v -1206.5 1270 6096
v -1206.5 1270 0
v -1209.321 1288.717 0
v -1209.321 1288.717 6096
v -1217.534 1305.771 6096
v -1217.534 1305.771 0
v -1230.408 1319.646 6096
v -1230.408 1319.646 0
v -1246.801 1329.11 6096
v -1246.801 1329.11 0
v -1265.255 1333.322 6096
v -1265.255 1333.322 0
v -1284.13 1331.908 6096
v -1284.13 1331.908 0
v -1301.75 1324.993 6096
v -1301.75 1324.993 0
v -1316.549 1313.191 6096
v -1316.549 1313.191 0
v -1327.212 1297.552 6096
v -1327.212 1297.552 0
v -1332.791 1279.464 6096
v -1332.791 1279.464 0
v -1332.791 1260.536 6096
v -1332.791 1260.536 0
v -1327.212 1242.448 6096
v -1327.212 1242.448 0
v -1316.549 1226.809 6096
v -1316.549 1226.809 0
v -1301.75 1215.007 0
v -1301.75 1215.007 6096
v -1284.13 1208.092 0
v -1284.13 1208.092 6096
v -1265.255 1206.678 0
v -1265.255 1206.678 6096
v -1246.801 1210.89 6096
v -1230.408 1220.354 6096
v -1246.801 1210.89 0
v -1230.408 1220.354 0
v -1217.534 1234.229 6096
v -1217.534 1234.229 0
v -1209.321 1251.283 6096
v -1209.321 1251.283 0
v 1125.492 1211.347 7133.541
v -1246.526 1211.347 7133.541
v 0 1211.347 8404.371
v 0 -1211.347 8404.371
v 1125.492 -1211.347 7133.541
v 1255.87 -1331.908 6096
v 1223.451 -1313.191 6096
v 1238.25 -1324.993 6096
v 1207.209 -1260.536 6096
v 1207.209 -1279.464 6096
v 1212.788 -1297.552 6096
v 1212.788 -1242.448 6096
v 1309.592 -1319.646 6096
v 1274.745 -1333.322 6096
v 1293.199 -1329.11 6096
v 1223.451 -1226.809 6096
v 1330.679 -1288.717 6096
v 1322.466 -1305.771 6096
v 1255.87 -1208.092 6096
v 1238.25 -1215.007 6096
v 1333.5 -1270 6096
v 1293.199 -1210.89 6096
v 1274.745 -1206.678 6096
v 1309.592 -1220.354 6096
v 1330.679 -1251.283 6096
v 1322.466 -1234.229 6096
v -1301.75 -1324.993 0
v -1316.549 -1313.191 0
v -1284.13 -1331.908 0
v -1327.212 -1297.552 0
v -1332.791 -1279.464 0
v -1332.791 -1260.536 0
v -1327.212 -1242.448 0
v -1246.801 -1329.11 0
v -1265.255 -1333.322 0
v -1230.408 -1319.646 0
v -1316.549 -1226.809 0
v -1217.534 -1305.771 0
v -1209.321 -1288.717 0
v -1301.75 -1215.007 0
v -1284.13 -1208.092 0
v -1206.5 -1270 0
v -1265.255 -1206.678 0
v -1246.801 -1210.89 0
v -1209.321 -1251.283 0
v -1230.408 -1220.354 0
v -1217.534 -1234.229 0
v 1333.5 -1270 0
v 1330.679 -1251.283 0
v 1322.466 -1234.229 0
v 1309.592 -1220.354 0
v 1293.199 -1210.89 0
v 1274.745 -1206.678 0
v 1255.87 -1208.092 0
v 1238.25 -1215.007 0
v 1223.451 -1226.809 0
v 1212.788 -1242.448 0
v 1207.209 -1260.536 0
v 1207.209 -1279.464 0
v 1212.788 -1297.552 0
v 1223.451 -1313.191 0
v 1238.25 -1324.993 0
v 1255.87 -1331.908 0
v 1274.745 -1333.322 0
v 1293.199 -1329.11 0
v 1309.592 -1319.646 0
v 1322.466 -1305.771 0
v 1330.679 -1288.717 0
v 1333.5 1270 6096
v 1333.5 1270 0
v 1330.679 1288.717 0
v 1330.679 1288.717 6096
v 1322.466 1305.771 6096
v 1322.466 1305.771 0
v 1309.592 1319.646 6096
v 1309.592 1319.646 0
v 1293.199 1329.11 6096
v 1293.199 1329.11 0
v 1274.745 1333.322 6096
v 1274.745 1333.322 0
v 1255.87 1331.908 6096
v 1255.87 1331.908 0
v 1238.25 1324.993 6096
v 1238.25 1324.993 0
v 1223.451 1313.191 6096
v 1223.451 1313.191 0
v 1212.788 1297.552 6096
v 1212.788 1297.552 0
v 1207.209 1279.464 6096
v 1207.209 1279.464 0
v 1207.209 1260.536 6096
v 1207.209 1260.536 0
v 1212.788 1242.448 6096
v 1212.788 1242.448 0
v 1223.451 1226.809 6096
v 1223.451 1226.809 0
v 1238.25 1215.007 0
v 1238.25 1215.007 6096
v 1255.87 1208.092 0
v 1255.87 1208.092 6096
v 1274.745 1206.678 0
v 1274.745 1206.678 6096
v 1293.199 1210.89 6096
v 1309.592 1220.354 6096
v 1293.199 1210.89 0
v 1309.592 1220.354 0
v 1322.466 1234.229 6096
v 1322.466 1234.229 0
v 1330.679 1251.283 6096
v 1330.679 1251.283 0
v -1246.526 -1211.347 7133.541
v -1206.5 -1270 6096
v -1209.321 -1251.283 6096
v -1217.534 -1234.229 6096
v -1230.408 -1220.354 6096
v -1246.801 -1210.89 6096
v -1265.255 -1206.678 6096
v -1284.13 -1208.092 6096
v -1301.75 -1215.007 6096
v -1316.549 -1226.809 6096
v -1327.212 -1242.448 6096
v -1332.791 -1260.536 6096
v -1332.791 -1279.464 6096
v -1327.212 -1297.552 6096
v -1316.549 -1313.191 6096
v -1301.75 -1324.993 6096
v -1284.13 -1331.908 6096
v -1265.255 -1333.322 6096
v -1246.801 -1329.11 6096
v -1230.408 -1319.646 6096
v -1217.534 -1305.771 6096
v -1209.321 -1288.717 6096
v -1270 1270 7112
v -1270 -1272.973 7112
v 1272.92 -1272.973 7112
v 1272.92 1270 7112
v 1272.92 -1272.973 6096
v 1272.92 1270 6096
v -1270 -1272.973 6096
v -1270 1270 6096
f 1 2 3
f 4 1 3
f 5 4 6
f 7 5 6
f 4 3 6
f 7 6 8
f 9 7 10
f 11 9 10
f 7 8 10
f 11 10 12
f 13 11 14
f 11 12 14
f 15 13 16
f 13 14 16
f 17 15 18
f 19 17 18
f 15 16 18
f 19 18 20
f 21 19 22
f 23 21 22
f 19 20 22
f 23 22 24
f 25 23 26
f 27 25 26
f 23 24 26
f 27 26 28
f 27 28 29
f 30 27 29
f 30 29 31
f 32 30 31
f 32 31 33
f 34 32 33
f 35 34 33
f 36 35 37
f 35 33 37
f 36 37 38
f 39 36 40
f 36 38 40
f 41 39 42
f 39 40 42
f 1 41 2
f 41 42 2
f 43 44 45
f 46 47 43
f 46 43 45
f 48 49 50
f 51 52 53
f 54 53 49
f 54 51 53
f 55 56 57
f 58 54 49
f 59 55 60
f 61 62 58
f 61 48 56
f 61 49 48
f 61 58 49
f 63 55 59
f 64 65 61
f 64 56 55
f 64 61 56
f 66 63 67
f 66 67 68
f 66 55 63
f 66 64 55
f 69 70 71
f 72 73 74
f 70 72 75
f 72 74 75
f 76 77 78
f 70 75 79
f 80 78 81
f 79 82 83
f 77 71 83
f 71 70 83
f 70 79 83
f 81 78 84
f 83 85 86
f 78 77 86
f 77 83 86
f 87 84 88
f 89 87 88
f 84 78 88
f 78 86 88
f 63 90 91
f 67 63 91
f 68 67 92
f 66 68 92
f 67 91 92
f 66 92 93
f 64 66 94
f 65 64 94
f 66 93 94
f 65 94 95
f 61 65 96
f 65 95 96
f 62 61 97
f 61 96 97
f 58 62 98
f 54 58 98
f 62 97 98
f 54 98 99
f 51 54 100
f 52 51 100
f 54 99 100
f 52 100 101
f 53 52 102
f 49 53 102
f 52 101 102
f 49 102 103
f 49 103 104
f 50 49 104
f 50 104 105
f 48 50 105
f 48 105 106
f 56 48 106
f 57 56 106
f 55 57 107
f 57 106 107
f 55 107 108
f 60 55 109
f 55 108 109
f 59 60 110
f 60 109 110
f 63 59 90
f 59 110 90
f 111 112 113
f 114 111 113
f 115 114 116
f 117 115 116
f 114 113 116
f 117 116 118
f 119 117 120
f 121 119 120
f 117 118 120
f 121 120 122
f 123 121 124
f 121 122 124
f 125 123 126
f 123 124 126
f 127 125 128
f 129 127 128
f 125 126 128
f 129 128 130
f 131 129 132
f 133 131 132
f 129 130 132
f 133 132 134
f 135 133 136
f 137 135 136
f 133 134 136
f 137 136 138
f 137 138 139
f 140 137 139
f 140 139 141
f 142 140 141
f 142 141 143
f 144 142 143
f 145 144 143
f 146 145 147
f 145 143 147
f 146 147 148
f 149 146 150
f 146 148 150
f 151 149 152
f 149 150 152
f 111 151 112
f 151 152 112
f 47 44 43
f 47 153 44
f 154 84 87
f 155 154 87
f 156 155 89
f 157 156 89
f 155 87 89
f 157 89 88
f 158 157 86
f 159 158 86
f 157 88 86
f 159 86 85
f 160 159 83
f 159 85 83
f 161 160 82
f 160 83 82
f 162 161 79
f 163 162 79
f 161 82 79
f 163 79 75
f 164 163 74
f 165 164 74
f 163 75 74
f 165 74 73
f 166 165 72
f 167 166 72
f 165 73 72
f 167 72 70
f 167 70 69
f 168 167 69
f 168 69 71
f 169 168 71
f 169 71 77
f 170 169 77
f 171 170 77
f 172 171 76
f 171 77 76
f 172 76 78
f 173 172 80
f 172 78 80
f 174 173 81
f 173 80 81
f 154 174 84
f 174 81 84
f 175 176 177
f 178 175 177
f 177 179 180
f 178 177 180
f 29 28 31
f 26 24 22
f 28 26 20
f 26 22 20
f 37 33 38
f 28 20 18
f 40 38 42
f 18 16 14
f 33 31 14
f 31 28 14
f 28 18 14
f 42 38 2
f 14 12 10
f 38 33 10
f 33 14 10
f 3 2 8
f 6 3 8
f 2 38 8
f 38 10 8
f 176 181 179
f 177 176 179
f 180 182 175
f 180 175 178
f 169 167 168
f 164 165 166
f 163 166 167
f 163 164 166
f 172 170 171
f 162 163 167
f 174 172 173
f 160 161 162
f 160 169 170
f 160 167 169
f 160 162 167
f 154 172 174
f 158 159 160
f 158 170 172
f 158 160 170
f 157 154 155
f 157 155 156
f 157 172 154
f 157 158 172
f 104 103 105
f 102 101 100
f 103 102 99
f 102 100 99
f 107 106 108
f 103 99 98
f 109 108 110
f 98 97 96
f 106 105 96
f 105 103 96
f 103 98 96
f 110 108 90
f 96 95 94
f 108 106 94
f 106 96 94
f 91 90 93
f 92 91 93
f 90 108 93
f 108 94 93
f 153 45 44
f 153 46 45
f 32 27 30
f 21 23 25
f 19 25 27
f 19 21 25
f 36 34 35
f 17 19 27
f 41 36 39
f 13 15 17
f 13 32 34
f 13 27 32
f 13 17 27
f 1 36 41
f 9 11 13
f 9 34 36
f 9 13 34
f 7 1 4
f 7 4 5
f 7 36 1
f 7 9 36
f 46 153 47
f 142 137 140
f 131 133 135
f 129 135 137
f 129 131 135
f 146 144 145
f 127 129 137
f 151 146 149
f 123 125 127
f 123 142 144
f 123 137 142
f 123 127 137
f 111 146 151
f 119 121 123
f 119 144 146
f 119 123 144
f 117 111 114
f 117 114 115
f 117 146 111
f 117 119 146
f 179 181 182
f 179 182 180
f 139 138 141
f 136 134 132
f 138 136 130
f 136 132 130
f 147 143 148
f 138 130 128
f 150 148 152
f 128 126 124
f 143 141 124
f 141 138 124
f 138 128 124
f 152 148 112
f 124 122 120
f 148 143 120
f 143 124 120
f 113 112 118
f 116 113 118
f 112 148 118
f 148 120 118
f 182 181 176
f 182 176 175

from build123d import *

# Parameters (mm, degrees)
F0_R     = 63.5
F1_DEPTH = 6096
F2_W     = 2542.919774
F2_H     = 2542.972822
F3_DEPTH = 1016
F5_DEPTH = 1211.34666


with BuildPart() as f1:
    # F0 (on Top) → F1 (new body)
    with BuildSketch(Plane.XY):
        with Locations((-1270, 1270)):
            Circle(F0_R)
        with Locations((1270, 1270)):
            Circle(F0_R)
        with Locations((-1270, -1270)):
            Circle(F0_R)
        with Locations((1270, -1270)):
            Circle(F0_R)
    extrude(amount=F1_DEPTH)


with BuildPart() as f3:
    # F2 (on face) → F3 (new body)
    with BuildSketch(Plane.XY.offset(6096)):
        with Locations((1.459887, -1.486411)):
            Rectangle(F2_W, F2_H)
    extrude(amount=F3_DEPTH)


with BuildPart() as f5:
    # F4 (on Front) → F5 (new body, symmetric)
    with BuildSketch(Plane.XZ):
        Polygon((-1246.52644, 7133.54063), (1125.491619, 7133.54063), (0, 8404.371262), align=None)
    extrude(amount=F5_DEPTH, both=True)


solid = Compound([f1.part, f3.part, f5.part])
